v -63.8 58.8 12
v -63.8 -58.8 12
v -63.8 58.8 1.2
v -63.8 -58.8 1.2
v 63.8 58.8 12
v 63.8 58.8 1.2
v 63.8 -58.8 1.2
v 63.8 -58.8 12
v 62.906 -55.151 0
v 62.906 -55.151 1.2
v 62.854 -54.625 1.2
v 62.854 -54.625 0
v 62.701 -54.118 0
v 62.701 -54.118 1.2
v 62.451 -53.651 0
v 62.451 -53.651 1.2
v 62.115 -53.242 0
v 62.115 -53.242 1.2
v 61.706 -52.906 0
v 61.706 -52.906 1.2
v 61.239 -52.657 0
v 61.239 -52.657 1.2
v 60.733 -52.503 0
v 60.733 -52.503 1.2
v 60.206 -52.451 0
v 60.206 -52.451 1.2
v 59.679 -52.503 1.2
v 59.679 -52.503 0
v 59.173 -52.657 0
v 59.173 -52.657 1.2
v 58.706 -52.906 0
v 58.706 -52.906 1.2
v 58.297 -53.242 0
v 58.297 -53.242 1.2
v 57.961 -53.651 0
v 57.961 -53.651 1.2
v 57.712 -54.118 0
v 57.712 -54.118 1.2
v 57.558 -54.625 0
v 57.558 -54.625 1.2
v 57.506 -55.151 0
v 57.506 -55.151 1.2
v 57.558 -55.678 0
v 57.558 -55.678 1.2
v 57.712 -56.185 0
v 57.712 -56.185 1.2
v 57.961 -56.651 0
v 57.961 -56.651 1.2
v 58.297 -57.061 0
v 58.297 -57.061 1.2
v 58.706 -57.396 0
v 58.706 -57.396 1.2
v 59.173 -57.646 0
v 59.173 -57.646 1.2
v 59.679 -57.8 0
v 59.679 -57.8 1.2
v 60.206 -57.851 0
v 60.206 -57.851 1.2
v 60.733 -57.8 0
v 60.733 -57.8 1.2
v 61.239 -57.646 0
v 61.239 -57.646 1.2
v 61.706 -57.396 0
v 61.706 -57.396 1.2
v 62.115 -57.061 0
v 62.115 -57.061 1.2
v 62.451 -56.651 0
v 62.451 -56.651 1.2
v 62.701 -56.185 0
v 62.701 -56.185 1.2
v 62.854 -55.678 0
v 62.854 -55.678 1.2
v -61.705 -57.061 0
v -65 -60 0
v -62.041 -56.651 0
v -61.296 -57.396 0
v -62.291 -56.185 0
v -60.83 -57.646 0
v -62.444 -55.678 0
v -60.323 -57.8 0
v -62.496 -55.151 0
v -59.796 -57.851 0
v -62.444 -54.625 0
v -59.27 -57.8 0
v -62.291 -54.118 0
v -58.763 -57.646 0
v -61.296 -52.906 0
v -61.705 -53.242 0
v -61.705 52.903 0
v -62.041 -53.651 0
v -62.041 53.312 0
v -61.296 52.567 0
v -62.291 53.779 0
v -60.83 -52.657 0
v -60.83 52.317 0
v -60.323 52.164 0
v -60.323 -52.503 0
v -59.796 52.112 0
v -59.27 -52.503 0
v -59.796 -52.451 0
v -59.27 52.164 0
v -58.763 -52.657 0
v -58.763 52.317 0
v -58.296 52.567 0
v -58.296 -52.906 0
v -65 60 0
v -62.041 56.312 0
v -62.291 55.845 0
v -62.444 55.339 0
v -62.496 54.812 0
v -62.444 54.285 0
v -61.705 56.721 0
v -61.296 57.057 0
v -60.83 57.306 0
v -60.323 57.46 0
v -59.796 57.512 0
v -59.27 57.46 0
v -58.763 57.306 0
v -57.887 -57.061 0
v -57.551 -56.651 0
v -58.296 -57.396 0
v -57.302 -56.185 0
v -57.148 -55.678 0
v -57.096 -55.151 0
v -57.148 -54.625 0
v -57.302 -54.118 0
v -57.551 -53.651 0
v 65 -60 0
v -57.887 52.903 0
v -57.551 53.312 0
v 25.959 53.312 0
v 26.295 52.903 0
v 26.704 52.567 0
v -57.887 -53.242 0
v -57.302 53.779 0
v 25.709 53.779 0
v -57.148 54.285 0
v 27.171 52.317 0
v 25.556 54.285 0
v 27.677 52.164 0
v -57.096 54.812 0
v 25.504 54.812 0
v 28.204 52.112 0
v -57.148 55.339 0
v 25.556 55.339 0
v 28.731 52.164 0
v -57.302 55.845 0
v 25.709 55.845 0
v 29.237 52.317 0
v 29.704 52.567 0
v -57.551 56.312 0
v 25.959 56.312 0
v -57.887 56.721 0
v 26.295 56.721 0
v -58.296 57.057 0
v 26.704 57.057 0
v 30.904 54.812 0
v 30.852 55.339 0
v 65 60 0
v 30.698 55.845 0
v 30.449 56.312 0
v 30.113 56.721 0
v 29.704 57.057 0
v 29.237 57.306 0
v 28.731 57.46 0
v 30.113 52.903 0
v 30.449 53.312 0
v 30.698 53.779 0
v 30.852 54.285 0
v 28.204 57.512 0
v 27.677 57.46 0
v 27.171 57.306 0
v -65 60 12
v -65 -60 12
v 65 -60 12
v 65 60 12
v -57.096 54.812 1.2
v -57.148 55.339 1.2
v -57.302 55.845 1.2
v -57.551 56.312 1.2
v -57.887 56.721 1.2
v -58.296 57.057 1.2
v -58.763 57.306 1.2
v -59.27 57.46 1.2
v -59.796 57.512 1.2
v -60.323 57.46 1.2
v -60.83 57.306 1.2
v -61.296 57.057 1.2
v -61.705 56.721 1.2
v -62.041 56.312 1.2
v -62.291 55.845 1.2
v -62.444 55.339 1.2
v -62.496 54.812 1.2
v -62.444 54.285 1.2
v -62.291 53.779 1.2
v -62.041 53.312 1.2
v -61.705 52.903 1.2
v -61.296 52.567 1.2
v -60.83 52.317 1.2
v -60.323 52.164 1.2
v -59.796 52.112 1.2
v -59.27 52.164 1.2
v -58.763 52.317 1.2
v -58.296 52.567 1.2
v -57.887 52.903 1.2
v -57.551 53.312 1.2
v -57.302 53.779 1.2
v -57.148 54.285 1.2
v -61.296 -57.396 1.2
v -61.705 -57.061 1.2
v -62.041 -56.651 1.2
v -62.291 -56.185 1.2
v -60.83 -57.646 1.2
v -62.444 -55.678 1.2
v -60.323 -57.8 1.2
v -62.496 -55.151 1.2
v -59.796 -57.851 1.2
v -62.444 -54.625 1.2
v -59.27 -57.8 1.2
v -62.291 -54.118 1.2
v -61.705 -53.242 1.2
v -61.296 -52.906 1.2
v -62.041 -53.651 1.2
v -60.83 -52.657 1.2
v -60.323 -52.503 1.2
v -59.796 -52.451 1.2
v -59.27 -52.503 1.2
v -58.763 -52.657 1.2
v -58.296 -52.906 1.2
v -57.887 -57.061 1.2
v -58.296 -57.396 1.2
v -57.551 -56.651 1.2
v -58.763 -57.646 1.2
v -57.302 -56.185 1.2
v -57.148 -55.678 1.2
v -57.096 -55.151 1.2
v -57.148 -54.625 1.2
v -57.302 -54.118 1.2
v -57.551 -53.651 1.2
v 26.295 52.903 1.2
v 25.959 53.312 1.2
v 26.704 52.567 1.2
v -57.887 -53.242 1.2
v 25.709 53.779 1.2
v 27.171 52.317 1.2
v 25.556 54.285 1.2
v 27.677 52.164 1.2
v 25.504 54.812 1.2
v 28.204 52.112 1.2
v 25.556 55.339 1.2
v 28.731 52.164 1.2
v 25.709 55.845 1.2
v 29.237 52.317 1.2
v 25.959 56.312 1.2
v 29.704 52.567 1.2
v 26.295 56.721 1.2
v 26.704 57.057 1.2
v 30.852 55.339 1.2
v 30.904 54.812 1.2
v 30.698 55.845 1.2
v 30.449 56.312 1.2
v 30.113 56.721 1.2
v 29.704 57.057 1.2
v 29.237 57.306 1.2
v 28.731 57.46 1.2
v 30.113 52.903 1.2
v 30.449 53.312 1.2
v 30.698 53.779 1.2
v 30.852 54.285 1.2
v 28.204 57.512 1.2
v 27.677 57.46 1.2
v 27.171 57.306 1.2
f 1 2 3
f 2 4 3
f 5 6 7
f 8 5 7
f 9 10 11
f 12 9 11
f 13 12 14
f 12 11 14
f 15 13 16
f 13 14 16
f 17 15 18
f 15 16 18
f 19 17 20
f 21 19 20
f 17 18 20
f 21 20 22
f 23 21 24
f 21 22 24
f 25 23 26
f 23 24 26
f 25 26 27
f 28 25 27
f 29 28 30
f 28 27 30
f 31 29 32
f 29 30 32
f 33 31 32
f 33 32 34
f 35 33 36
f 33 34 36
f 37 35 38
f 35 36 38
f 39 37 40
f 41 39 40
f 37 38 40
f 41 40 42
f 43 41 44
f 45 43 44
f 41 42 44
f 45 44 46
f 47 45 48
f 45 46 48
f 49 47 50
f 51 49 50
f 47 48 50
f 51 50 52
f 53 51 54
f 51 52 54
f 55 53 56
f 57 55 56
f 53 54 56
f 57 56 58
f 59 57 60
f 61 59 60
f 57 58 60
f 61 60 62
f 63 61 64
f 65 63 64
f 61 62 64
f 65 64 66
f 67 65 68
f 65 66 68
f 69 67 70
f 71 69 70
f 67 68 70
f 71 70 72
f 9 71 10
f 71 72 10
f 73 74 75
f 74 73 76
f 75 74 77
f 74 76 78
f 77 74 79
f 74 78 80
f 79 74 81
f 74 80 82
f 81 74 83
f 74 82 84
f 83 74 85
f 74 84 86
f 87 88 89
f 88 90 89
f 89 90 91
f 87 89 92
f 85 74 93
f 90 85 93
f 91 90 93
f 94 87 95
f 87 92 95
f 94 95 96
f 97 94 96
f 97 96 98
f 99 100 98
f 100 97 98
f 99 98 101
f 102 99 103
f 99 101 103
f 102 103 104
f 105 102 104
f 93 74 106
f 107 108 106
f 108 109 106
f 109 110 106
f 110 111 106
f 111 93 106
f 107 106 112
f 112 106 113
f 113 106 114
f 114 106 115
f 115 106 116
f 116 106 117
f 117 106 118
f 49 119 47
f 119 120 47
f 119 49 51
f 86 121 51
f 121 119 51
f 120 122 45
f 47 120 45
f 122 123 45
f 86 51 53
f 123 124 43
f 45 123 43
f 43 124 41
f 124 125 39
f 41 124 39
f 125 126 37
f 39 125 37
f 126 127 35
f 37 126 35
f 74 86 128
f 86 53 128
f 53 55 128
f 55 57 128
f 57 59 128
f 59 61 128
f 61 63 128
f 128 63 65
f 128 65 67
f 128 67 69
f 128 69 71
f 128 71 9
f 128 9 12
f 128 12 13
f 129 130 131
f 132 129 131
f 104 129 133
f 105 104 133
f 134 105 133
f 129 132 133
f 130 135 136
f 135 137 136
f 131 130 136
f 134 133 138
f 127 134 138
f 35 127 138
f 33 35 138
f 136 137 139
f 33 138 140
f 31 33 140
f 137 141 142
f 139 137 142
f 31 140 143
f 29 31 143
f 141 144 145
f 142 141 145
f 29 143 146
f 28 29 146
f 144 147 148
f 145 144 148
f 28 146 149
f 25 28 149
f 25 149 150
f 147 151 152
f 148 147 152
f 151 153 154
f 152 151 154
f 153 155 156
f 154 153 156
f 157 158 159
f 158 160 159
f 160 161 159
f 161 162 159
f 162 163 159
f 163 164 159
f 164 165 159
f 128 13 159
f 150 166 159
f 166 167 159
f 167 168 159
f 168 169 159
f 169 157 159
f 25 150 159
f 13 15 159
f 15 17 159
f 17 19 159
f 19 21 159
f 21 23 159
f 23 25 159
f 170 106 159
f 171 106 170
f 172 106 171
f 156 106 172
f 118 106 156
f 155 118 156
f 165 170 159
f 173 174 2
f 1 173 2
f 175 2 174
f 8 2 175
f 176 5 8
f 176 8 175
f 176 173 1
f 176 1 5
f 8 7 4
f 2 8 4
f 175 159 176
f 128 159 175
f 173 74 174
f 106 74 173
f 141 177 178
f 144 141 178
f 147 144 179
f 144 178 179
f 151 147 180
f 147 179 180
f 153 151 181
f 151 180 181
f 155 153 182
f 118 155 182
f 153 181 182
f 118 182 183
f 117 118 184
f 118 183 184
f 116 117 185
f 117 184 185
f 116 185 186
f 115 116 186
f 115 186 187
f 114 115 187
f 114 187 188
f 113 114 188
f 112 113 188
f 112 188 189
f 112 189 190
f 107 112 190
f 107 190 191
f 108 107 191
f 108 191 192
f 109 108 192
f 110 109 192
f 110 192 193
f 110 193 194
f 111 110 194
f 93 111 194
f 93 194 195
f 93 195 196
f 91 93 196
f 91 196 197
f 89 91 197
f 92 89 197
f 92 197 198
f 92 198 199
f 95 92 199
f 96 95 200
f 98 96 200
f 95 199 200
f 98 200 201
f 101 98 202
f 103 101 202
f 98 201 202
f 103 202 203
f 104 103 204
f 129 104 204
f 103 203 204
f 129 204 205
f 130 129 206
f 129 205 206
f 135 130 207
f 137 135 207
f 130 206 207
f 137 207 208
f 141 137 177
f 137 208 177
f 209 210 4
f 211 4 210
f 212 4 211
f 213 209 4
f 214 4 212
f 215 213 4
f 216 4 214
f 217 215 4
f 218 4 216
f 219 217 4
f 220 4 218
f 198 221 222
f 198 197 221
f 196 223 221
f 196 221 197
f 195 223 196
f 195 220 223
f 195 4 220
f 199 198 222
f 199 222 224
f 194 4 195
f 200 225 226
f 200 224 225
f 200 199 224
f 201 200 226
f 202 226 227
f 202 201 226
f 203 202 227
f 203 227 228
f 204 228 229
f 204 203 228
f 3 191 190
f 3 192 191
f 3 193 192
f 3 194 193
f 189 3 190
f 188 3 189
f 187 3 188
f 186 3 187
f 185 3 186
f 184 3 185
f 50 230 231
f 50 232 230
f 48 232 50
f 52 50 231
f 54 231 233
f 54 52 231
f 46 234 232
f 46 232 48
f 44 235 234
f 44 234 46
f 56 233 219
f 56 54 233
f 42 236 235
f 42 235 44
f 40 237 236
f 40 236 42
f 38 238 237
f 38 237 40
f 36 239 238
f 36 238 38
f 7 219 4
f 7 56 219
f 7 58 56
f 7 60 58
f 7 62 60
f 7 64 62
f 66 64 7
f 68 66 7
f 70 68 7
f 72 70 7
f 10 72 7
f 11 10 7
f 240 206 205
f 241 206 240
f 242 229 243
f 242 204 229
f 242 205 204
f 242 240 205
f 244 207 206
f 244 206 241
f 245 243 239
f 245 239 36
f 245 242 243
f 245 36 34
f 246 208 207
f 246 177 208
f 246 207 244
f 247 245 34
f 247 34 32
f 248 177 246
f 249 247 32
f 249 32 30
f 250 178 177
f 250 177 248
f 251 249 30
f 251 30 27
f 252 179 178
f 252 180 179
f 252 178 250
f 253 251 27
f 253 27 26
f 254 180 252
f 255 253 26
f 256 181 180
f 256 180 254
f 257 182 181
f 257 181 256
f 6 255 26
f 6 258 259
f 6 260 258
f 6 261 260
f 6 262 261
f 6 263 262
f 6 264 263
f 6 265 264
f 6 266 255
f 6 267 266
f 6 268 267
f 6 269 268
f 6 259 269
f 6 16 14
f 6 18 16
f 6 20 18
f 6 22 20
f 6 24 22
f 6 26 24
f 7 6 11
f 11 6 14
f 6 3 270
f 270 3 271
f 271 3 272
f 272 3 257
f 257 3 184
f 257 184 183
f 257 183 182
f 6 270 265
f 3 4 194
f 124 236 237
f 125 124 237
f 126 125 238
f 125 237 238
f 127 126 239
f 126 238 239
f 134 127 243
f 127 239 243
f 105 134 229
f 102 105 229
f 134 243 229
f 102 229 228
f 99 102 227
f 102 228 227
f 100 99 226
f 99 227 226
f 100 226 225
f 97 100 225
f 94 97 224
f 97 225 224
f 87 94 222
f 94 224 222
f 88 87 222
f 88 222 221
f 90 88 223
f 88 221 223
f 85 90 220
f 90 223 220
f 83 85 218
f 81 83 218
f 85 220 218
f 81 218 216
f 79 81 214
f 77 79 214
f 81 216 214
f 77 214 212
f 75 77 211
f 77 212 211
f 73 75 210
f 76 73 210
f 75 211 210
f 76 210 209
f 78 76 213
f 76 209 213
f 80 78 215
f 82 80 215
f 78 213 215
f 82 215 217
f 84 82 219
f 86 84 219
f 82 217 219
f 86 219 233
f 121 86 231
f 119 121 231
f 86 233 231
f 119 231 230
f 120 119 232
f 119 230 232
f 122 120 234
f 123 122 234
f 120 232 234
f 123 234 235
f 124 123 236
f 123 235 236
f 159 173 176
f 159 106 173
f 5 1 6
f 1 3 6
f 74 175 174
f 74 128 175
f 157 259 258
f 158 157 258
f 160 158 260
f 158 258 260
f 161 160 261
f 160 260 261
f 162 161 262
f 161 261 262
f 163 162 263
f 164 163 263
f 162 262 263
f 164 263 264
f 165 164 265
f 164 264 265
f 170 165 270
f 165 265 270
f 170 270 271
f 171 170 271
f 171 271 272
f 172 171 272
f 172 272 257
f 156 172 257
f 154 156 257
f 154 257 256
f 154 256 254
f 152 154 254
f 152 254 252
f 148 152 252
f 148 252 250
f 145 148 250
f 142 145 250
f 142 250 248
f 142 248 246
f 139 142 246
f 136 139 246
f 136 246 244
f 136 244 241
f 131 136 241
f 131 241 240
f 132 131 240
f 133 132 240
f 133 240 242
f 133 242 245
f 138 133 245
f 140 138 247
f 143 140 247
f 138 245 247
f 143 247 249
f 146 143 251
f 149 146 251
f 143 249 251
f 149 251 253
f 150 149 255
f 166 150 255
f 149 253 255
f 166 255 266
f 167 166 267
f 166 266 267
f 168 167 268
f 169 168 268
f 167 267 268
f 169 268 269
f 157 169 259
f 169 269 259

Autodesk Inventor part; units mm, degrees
ref_plane "YZ Plane" through (0, 0, 0) normal (1, 0, 0) x (0, 1, 0)
ref_plane "XZ Plane" through (0, 0, 0) normal (0, 1, 0) x (-1, 0, 0)
ref_plane "XY Plane" through (0, 0, 0) normal (0, 0, 1) x (1, 0, 0)
sketch "스케치1" plane through (0, 0, 0) normal (0, 0, 1) x (1, 0, 0)
  line L0 (65, -60) -> (-65, -60)
  line L1 (-65, -60) -> (-65, 60)
  line L2 (-65, 60) -> (65, 60)
  line L3 (65, 60) -> (65, -60)
  line L4 (65, -60) -> (-65, 60) construction
  line L5 (-65, -60) -> (65, 60) construction
  line L6 (63, 58) -> (-63, 58) construction
  line L7 (-63, 58) -> (-63, -58) construction
  line L8 (-63, -58) -> (63, -58) construction
  line L9 (63, -58) -> (63, 58) construction
  point P0 (0, 0)
  dimension "d0" = 130
  dimension "d1" = 120
  dimension "d2" = 2
extrude "돌출1" add sketch "스케치1" along normal blind 12
shell "쉘1" thickness 1.2 removed faces 1 at (21.6667, 20, 12)
sketch "스케치2" plane through (-63.8, -58.8, 1.2) normal (0, 0, 1) x (1, 0, 0)
  point P0 (63.8, 58.8)
sketch "스케치3" plane through (-63.8, -58.8, 1.2) normal (0, 0, 1) x (1, 0, 0)
  circle A0 centre (92.0039, 113.6118) radius 2.7
  circle A1 centre (4.0037, 3.6486) radius 2.7
  circle A2 centre (4.0037, 113.6118) radius 2.7
  circle A3 centre (124.0062, 3.6486) radius 2.7
  point P0 (63.8, 58.8)
  dimension "d6" = 5.4
  dimension "d7" = 5.4
  dimension "d8" = 5.4
  dimension "d9" = 5.4
extrude "돌출2" cut sketch "스케치3" against normal blind 12
properties part number "240621_pt1"
